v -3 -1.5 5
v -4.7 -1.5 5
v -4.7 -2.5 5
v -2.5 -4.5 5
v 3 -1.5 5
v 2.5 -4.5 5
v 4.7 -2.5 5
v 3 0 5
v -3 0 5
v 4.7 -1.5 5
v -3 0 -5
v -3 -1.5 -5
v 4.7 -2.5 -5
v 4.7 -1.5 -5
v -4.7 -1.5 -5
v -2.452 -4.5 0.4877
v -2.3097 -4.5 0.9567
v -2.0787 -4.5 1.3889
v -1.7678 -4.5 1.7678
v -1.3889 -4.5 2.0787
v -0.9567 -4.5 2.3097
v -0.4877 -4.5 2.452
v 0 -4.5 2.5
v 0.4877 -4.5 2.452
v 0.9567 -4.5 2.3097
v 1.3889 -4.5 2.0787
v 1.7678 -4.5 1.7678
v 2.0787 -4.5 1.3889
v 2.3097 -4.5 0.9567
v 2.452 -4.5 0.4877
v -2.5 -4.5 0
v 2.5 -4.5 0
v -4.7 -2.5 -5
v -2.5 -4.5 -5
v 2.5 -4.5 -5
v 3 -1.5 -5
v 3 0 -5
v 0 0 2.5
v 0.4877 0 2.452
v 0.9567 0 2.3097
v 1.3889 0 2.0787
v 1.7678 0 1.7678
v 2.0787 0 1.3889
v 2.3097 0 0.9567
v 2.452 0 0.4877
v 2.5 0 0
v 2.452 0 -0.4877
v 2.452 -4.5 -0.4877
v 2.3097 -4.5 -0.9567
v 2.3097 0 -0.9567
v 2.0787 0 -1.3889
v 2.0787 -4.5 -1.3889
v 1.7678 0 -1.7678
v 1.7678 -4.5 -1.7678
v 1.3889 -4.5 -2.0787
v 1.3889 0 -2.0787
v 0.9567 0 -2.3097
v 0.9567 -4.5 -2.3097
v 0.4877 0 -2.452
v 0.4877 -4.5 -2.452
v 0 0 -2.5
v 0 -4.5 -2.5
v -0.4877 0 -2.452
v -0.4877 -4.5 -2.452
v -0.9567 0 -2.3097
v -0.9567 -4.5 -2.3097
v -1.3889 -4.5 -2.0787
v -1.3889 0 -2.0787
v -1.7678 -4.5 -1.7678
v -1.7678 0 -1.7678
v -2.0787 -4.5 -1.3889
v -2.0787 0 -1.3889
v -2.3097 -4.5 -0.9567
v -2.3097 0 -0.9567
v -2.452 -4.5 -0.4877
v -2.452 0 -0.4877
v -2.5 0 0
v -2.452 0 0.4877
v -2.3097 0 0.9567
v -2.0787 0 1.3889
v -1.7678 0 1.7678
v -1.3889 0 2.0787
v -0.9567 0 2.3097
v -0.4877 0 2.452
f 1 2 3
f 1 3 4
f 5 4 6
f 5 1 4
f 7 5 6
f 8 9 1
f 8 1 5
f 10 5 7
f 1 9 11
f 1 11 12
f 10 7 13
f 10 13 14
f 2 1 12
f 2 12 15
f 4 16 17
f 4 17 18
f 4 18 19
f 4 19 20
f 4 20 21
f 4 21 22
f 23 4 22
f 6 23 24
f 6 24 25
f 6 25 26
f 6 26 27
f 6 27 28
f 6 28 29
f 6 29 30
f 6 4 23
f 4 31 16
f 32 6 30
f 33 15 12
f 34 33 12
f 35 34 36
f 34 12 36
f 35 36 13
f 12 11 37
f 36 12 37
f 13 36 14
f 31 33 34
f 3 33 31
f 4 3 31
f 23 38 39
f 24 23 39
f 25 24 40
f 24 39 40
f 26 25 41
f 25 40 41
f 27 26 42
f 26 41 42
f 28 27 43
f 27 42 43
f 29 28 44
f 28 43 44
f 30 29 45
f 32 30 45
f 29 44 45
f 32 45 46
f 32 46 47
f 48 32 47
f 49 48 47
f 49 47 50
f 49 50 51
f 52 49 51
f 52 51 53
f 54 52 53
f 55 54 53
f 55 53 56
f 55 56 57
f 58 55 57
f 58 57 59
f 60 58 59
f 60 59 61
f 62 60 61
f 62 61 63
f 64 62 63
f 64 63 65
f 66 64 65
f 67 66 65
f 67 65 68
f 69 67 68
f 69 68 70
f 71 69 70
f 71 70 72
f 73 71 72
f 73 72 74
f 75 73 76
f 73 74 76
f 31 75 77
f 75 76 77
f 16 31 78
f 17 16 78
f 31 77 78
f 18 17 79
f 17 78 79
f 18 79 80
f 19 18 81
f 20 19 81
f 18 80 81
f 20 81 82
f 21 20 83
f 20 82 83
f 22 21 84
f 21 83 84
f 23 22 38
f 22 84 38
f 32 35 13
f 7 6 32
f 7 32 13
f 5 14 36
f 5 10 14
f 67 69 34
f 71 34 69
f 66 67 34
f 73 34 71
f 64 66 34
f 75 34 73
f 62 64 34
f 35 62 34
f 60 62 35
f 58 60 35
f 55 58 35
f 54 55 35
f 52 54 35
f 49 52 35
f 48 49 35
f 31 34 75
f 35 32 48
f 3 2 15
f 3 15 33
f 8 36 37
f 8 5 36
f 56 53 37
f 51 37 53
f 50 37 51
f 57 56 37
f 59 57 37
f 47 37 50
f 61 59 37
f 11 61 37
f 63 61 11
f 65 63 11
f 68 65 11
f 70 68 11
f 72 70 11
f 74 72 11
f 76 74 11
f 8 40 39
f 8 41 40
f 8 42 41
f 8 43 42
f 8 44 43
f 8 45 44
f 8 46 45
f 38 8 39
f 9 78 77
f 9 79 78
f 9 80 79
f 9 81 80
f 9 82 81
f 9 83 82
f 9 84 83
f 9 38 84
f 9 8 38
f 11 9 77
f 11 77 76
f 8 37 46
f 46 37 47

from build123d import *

# Parameters (mm, degrees)
EXTRUDE_1_DEPTH     = 5
SKETCH_2_R          = 2.5
CUT_EXTRUDE_1_DEPTH = 5.5


with BuildPart() as part:
    # Эскиз1 → Бобышка-Вытянуть1 (new body, symmetric)
    with BuildSketch(Plane.XY):
        Polygon((3, 0), (-3, 0), (-3, -1.5), (-4.7, -1.5), (-4.7, -2.5), (-2.5, -4.5), (2.5, -4.5), (4.7, -2.5), (4.7, -1.5), (3, -1.5), align=None)
    extrude(amount=EXTRUDE_1_DEPTH, both=True)

    # Эскиз2 → Вырез-Вытянуть1 (cut, through all)
    with BuildSketch(Plane(origin=(0, 0, 0), x_dir=(1, 0, 0), z_dir=(0, 1, 0))):
        with Locations(Location((0, 0, 0), (0, 0, 270))):  # turned: the seam where the file's is
            Circle(SKETCH_2_R)
    extrude(amount=-CUT_EXTRUDE_1_DEPTH, mode=Mode.SUBTRACT)


solid = part.part
